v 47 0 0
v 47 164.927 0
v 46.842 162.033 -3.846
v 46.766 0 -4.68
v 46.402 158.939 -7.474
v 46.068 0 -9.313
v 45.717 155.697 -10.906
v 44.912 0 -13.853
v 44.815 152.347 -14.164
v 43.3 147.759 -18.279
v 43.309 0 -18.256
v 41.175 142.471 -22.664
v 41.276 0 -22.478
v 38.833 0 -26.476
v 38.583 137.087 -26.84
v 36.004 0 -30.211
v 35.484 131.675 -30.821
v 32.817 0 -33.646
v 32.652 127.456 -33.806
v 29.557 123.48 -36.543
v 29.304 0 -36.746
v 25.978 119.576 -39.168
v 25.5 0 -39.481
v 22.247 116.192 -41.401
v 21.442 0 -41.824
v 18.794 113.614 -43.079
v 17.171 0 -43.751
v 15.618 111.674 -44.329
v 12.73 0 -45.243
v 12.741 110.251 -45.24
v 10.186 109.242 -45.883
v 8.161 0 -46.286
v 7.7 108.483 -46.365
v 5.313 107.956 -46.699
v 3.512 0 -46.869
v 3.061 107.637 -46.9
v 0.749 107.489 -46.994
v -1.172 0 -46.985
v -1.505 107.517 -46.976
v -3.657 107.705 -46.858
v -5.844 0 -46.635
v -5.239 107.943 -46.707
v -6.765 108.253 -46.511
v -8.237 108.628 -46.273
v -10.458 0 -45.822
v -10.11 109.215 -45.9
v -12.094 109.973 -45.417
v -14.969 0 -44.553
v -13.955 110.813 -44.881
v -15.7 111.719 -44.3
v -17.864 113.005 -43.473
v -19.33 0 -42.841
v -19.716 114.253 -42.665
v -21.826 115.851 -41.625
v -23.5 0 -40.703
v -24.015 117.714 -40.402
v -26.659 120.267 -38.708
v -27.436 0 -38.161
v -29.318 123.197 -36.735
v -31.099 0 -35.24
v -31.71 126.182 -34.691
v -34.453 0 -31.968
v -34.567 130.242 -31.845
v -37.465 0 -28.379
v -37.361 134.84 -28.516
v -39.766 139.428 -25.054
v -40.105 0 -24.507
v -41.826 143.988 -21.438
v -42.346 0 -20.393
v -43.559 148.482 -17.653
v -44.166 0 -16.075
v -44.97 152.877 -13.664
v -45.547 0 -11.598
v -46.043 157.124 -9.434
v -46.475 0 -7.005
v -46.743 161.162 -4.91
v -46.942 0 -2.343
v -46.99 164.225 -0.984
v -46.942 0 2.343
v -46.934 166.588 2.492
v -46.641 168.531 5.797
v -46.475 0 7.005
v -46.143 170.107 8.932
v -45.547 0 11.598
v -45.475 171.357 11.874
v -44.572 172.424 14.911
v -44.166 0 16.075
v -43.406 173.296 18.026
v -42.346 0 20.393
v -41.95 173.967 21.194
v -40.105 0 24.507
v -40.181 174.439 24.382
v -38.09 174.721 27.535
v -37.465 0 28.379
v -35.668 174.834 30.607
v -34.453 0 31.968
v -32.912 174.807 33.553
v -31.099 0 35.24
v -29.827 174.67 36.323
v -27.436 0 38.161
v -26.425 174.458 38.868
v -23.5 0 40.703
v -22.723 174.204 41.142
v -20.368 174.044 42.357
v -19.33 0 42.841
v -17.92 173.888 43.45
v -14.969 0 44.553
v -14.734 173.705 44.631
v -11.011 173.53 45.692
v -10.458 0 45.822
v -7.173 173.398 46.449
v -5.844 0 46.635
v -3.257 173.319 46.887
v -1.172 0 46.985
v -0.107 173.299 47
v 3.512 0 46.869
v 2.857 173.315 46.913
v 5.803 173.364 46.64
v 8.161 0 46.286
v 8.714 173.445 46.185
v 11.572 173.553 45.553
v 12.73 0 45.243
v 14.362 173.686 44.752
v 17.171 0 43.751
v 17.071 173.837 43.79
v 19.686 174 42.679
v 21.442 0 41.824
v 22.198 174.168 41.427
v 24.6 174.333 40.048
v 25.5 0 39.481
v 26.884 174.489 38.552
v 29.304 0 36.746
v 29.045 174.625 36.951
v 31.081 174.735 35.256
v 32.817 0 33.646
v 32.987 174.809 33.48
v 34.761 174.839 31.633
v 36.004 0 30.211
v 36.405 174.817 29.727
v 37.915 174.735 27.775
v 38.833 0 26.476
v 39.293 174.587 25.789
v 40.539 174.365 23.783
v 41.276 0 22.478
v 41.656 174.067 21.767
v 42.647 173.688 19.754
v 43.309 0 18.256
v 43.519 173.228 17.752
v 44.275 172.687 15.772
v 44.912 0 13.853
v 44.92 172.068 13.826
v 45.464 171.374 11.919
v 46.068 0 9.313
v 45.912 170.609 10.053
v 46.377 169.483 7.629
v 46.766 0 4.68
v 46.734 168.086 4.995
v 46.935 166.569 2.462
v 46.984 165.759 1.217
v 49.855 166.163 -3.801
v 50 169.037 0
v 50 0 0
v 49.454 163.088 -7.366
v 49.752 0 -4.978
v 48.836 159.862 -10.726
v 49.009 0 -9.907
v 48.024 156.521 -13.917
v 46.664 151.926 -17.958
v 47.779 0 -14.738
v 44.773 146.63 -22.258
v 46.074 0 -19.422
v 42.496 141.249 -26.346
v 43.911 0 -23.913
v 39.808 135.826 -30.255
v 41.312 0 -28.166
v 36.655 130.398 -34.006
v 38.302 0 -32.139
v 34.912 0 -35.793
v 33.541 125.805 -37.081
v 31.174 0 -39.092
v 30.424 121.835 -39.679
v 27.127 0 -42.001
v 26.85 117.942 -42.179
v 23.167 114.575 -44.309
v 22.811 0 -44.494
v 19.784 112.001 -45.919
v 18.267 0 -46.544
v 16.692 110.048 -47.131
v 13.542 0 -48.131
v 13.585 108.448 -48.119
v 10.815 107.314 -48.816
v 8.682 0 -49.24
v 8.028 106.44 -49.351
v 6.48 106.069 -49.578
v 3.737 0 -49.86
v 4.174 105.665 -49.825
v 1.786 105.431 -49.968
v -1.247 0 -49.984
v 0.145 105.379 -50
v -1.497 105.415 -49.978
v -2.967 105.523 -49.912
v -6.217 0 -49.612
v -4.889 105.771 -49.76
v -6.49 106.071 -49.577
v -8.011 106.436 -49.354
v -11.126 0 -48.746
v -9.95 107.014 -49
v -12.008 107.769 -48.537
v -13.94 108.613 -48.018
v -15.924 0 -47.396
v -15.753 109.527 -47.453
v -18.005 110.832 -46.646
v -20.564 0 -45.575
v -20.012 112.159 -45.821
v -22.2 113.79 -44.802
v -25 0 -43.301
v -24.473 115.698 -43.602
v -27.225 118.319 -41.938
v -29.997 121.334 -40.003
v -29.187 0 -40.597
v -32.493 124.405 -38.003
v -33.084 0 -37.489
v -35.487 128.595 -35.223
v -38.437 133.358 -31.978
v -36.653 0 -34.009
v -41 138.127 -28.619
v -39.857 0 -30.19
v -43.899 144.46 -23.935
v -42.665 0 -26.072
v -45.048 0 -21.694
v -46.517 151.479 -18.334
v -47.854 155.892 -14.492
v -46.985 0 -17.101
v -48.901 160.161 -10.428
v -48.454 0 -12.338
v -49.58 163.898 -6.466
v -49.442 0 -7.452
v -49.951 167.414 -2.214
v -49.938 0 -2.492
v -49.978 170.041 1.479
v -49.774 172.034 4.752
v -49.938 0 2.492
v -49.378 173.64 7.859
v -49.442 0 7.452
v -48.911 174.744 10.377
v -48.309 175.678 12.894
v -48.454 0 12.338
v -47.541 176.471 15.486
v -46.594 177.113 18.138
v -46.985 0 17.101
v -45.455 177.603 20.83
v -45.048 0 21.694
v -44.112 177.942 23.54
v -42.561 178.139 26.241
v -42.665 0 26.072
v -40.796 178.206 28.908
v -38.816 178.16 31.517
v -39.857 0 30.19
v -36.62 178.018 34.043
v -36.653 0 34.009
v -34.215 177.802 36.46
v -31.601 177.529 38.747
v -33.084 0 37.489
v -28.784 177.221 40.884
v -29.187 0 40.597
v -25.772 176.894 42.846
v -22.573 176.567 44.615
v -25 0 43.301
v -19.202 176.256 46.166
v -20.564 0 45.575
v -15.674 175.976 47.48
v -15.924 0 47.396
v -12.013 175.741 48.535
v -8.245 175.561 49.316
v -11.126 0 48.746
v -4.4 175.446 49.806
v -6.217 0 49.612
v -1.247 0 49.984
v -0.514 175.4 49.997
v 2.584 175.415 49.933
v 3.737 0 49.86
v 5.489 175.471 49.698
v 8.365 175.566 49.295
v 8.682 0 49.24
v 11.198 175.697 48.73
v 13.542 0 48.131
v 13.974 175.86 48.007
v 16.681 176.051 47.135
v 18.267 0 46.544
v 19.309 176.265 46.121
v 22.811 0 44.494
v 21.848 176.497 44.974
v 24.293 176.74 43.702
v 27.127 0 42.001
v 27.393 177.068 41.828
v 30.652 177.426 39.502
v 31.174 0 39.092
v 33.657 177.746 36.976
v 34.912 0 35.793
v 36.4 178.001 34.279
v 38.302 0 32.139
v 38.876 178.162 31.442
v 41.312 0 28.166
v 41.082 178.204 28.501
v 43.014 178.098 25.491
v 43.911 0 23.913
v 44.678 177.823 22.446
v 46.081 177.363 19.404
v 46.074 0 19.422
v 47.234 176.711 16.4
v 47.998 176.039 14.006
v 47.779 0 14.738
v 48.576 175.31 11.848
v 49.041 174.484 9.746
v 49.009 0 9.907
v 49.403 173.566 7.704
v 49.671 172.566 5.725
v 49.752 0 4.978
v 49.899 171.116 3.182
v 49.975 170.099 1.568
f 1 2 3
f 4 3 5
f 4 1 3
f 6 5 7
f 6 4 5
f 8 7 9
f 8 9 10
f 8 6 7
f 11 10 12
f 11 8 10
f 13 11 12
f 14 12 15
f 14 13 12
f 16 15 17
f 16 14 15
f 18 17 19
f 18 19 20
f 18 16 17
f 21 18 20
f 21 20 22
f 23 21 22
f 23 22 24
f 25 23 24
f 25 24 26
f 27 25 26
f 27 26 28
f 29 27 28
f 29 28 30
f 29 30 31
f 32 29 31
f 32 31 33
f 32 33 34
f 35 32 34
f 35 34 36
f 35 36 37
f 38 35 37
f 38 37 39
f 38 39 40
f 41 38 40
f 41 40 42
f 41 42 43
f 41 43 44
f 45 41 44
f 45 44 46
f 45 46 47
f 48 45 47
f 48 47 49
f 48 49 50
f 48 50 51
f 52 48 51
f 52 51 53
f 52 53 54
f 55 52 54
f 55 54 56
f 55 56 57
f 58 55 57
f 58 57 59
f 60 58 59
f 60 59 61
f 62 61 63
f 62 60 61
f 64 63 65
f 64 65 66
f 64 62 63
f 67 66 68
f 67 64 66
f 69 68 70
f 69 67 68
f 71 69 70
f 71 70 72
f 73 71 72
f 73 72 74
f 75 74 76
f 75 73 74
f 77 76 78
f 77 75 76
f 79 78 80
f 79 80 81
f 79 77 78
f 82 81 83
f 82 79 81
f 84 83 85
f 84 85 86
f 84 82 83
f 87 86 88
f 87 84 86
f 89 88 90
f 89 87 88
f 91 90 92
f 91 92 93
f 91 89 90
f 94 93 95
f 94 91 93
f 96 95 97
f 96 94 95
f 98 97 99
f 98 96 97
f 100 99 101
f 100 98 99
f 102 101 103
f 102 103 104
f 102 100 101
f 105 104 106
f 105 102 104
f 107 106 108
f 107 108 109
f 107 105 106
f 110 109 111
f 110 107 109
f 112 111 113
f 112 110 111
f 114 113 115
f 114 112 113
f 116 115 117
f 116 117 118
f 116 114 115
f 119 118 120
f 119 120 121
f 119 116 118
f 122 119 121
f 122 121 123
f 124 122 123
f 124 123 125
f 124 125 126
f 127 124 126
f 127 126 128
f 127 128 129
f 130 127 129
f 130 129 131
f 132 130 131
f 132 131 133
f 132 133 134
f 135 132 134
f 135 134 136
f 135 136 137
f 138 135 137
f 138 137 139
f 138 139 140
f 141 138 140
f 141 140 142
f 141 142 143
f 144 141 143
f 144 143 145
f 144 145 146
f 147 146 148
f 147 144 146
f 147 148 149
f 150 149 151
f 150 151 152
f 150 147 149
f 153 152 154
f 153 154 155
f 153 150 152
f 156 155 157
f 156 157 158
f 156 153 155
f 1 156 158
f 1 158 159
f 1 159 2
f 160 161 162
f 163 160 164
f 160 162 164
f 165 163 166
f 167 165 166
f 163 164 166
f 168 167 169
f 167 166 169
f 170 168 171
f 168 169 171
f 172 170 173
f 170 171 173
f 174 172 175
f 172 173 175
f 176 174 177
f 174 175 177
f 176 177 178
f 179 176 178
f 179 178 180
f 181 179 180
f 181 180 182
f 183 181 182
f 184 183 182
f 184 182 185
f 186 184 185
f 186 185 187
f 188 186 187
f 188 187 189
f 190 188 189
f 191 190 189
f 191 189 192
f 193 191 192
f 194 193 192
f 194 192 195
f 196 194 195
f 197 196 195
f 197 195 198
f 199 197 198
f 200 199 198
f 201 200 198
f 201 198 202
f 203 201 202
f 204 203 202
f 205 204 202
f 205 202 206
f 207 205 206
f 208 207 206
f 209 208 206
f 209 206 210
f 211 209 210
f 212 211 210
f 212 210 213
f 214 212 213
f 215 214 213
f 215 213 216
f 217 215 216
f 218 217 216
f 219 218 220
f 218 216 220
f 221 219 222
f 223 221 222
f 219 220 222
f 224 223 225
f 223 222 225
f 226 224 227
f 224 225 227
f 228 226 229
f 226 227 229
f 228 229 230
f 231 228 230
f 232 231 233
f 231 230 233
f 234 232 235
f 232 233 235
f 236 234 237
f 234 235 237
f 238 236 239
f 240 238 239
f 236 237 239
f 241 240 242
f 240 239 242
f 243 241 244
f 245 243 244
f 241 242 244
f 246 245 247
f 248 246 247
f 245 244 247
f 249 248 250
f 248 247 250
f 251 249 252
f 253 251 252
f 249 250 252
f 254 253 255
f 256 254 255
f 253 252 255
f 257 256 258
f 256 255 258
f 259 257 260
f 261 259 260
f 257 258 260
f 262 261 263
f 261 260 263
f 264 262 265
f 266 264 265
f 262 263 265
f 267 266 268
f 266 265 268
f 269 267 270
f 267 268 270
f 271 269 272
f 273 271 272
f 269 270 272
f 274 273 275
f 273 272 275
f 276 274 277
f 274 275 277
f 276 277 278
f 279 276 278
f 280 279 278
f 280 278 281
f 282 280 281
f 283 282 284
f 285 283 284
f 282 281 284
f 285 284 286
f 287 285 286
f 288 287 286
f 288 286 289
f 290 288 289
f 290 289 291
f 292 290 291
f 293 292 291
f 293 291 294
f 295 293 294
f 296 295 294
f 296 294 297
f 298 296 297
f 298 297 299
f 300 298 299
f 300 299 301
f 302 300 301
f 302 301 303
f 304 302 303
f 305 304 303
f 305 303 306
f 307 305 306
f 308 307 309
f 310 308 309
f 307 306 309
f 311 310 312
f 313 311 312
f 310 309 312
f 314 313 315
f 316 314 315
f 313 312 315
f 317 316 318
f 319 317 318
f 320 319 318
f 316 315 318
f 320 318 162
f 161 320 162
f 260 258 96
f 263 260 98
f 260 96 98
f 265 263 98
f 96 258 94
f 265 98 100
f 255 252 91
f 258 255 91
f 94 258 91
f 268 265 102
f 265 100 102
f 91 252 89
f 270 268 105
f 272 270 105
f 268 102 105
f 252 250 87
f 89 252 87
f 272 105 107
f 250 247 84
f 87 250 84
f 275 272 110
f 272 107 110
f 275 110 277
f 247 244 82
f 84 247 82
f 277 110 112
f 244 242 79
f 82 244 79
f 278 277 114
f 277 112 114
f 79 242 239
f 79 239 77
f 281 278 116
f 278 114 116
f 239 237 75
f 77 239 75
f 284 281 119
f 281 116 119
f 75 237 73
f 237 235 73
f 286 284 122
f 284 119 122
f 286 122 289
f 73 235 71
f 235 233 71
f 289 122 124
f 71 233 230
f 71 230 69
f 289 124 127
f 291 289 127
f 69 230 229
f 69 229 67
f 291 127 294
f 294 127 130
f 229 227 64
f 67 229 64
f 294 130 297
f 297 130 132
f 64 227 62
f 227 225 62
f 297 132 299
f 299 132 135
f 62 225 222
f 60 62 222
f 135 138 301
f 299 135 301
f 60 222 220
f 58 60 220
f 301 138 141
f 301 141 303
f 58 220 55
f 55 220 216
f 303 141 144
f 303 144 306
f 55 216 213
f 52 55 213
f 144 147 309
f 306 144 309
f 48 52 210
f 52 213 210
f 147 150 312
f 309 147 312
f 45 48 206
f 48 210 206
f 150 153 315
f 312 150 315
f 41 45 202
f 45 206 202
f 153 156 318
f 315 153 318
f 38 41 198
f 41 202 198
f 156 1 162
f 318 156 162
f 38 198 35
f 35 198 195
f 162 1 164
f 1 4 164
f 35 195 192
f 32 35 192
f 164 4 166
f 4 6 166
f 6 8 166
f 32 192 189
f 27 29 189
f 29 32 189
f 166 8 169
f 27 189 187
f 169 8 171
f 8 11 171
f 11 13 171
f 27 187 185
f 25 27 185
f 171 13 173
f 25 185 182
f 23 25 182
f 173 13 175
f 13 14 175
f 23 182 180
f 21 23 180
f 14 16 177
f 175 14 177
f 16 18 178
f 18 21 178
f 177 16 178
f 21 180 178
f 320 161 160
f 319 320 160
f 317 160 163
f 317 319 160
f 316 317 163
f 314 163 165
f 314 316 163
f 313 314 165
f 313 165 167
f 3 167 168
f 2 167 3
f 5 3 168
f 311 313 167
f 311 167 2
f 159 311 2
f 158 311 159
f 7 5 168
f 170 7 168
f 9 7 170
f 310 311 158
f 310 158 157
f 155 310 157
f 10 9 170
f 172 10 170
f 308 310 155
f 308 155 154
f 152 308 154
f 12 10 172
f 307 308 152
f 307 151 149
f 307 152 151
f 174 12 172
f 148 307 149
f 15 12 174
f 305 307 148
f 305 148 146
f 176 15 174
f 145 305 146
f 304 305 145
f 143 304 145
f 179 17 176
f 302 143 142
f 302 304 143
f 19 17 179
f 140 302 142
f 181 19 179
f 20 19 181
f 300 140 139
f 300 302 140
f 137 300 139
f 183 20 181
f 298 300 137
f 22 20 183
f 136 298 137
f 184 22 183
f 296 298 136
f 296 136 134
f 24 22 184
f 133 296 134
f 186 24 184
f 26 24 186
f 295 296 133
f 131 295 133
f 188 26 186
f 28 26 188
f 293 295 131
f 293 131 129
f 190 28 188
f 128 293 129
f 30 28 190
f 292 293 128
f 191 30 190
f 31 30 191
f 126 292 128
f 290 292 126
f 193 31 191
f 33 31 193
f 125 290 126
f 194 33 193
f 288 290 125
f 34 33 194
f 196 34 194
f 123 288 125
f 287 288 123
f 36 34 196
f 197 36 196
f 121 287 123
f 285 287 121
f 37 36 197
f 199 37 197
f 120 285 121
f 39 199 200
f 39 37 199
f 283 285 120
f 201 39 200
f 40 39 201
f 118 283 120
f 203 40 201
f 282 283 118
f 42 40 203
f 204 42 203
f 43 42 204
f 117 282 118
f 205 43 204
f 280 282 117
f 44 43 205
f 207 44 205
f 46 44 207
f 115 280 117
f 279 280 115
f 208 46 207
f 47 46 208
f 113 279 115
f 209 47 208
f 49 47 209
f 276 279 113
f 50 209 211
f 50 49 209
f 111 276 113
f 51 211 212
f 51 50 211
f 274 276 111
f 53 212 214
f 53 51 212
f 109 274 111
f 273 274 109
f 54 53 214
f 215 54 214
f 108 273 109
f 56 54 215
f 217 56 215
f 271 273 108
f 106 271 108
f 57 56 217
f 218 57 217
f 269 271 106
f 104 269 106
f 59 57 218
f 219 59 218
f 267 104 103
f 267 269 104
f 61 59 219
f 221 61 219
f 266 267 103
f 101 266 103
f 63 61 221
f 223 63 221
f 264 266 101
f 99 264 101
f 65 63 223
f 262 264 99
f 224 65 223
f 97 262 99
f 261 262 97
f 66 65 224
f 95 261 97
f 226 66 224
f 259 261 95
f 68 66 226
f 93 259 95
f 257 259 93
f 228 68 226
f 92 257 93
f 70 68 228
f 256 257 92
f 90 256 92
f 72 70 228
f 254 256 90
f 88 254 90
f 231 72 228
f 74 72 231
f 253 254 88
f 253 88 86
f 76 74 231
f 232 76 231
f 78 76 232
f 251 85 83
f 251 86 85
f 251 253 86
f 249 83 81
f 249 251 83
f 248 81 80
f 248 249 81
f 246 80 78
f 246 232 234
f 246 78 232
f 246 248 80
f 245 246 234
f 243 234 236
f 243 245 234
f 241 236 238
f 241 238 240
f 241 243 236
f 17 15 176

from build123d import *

# Parameters (mm, degrees)
EXTRUDE_1_OUTLINE_R      = 50
EXTRUDE_1_OUTLINE_R_2    = 47
EXTRUDE_1_DEPTH          = 200
CUT_EXTRUDE_1_DEPTH      = 213.132034356
CUT_EXTRUDE_1_DEPTH_BACK = 213.132034356
SKETCH_2_R               = 65


# Read off the part's stored shape, not the designer's step: Вытянуть-Тонкостенный1
with BuildPart() as part:
    # Вытянуть-Тонкостенный1 outline → Вытянуть-Тонкостенный1 (new body)
    with BuildSketch(Plane(origin=(0, 0, 0), x_dir=(1, 0, 0), z_dir=(0, 1, 0))):
        Circle(EXTRUDE_1_OUTLINE_R)
        Circle(EXTRUDE_1_OUTLINE_R_2, mode=Mode.SUBTRACT)
    extrude(amount=EXTRUDE_1_DEPTH)

    # Эскиз2 → Вырез-Вытянуть1 (cut, two sides: drawn at the far end of the back side and taken through both)
    with BuildSketch(Plane(origin=(0, 0, 0), x_dir=(1, 0, 0), z_dir=(0, -0.5735764363510444, -0.819152044288993)).offset(-CUT_EXTRUDE_1_DEPTH_BACK)):
        with Locations((0, -180)):
            Circle(SKETCH_2_R)
    extrude(amount=CUT_EXTRUDE_1_DEPTH + CUT_EXTRUDE_1_DEPTH_BACK, mode=Mode.SUBTRACT)


solid = part.part
